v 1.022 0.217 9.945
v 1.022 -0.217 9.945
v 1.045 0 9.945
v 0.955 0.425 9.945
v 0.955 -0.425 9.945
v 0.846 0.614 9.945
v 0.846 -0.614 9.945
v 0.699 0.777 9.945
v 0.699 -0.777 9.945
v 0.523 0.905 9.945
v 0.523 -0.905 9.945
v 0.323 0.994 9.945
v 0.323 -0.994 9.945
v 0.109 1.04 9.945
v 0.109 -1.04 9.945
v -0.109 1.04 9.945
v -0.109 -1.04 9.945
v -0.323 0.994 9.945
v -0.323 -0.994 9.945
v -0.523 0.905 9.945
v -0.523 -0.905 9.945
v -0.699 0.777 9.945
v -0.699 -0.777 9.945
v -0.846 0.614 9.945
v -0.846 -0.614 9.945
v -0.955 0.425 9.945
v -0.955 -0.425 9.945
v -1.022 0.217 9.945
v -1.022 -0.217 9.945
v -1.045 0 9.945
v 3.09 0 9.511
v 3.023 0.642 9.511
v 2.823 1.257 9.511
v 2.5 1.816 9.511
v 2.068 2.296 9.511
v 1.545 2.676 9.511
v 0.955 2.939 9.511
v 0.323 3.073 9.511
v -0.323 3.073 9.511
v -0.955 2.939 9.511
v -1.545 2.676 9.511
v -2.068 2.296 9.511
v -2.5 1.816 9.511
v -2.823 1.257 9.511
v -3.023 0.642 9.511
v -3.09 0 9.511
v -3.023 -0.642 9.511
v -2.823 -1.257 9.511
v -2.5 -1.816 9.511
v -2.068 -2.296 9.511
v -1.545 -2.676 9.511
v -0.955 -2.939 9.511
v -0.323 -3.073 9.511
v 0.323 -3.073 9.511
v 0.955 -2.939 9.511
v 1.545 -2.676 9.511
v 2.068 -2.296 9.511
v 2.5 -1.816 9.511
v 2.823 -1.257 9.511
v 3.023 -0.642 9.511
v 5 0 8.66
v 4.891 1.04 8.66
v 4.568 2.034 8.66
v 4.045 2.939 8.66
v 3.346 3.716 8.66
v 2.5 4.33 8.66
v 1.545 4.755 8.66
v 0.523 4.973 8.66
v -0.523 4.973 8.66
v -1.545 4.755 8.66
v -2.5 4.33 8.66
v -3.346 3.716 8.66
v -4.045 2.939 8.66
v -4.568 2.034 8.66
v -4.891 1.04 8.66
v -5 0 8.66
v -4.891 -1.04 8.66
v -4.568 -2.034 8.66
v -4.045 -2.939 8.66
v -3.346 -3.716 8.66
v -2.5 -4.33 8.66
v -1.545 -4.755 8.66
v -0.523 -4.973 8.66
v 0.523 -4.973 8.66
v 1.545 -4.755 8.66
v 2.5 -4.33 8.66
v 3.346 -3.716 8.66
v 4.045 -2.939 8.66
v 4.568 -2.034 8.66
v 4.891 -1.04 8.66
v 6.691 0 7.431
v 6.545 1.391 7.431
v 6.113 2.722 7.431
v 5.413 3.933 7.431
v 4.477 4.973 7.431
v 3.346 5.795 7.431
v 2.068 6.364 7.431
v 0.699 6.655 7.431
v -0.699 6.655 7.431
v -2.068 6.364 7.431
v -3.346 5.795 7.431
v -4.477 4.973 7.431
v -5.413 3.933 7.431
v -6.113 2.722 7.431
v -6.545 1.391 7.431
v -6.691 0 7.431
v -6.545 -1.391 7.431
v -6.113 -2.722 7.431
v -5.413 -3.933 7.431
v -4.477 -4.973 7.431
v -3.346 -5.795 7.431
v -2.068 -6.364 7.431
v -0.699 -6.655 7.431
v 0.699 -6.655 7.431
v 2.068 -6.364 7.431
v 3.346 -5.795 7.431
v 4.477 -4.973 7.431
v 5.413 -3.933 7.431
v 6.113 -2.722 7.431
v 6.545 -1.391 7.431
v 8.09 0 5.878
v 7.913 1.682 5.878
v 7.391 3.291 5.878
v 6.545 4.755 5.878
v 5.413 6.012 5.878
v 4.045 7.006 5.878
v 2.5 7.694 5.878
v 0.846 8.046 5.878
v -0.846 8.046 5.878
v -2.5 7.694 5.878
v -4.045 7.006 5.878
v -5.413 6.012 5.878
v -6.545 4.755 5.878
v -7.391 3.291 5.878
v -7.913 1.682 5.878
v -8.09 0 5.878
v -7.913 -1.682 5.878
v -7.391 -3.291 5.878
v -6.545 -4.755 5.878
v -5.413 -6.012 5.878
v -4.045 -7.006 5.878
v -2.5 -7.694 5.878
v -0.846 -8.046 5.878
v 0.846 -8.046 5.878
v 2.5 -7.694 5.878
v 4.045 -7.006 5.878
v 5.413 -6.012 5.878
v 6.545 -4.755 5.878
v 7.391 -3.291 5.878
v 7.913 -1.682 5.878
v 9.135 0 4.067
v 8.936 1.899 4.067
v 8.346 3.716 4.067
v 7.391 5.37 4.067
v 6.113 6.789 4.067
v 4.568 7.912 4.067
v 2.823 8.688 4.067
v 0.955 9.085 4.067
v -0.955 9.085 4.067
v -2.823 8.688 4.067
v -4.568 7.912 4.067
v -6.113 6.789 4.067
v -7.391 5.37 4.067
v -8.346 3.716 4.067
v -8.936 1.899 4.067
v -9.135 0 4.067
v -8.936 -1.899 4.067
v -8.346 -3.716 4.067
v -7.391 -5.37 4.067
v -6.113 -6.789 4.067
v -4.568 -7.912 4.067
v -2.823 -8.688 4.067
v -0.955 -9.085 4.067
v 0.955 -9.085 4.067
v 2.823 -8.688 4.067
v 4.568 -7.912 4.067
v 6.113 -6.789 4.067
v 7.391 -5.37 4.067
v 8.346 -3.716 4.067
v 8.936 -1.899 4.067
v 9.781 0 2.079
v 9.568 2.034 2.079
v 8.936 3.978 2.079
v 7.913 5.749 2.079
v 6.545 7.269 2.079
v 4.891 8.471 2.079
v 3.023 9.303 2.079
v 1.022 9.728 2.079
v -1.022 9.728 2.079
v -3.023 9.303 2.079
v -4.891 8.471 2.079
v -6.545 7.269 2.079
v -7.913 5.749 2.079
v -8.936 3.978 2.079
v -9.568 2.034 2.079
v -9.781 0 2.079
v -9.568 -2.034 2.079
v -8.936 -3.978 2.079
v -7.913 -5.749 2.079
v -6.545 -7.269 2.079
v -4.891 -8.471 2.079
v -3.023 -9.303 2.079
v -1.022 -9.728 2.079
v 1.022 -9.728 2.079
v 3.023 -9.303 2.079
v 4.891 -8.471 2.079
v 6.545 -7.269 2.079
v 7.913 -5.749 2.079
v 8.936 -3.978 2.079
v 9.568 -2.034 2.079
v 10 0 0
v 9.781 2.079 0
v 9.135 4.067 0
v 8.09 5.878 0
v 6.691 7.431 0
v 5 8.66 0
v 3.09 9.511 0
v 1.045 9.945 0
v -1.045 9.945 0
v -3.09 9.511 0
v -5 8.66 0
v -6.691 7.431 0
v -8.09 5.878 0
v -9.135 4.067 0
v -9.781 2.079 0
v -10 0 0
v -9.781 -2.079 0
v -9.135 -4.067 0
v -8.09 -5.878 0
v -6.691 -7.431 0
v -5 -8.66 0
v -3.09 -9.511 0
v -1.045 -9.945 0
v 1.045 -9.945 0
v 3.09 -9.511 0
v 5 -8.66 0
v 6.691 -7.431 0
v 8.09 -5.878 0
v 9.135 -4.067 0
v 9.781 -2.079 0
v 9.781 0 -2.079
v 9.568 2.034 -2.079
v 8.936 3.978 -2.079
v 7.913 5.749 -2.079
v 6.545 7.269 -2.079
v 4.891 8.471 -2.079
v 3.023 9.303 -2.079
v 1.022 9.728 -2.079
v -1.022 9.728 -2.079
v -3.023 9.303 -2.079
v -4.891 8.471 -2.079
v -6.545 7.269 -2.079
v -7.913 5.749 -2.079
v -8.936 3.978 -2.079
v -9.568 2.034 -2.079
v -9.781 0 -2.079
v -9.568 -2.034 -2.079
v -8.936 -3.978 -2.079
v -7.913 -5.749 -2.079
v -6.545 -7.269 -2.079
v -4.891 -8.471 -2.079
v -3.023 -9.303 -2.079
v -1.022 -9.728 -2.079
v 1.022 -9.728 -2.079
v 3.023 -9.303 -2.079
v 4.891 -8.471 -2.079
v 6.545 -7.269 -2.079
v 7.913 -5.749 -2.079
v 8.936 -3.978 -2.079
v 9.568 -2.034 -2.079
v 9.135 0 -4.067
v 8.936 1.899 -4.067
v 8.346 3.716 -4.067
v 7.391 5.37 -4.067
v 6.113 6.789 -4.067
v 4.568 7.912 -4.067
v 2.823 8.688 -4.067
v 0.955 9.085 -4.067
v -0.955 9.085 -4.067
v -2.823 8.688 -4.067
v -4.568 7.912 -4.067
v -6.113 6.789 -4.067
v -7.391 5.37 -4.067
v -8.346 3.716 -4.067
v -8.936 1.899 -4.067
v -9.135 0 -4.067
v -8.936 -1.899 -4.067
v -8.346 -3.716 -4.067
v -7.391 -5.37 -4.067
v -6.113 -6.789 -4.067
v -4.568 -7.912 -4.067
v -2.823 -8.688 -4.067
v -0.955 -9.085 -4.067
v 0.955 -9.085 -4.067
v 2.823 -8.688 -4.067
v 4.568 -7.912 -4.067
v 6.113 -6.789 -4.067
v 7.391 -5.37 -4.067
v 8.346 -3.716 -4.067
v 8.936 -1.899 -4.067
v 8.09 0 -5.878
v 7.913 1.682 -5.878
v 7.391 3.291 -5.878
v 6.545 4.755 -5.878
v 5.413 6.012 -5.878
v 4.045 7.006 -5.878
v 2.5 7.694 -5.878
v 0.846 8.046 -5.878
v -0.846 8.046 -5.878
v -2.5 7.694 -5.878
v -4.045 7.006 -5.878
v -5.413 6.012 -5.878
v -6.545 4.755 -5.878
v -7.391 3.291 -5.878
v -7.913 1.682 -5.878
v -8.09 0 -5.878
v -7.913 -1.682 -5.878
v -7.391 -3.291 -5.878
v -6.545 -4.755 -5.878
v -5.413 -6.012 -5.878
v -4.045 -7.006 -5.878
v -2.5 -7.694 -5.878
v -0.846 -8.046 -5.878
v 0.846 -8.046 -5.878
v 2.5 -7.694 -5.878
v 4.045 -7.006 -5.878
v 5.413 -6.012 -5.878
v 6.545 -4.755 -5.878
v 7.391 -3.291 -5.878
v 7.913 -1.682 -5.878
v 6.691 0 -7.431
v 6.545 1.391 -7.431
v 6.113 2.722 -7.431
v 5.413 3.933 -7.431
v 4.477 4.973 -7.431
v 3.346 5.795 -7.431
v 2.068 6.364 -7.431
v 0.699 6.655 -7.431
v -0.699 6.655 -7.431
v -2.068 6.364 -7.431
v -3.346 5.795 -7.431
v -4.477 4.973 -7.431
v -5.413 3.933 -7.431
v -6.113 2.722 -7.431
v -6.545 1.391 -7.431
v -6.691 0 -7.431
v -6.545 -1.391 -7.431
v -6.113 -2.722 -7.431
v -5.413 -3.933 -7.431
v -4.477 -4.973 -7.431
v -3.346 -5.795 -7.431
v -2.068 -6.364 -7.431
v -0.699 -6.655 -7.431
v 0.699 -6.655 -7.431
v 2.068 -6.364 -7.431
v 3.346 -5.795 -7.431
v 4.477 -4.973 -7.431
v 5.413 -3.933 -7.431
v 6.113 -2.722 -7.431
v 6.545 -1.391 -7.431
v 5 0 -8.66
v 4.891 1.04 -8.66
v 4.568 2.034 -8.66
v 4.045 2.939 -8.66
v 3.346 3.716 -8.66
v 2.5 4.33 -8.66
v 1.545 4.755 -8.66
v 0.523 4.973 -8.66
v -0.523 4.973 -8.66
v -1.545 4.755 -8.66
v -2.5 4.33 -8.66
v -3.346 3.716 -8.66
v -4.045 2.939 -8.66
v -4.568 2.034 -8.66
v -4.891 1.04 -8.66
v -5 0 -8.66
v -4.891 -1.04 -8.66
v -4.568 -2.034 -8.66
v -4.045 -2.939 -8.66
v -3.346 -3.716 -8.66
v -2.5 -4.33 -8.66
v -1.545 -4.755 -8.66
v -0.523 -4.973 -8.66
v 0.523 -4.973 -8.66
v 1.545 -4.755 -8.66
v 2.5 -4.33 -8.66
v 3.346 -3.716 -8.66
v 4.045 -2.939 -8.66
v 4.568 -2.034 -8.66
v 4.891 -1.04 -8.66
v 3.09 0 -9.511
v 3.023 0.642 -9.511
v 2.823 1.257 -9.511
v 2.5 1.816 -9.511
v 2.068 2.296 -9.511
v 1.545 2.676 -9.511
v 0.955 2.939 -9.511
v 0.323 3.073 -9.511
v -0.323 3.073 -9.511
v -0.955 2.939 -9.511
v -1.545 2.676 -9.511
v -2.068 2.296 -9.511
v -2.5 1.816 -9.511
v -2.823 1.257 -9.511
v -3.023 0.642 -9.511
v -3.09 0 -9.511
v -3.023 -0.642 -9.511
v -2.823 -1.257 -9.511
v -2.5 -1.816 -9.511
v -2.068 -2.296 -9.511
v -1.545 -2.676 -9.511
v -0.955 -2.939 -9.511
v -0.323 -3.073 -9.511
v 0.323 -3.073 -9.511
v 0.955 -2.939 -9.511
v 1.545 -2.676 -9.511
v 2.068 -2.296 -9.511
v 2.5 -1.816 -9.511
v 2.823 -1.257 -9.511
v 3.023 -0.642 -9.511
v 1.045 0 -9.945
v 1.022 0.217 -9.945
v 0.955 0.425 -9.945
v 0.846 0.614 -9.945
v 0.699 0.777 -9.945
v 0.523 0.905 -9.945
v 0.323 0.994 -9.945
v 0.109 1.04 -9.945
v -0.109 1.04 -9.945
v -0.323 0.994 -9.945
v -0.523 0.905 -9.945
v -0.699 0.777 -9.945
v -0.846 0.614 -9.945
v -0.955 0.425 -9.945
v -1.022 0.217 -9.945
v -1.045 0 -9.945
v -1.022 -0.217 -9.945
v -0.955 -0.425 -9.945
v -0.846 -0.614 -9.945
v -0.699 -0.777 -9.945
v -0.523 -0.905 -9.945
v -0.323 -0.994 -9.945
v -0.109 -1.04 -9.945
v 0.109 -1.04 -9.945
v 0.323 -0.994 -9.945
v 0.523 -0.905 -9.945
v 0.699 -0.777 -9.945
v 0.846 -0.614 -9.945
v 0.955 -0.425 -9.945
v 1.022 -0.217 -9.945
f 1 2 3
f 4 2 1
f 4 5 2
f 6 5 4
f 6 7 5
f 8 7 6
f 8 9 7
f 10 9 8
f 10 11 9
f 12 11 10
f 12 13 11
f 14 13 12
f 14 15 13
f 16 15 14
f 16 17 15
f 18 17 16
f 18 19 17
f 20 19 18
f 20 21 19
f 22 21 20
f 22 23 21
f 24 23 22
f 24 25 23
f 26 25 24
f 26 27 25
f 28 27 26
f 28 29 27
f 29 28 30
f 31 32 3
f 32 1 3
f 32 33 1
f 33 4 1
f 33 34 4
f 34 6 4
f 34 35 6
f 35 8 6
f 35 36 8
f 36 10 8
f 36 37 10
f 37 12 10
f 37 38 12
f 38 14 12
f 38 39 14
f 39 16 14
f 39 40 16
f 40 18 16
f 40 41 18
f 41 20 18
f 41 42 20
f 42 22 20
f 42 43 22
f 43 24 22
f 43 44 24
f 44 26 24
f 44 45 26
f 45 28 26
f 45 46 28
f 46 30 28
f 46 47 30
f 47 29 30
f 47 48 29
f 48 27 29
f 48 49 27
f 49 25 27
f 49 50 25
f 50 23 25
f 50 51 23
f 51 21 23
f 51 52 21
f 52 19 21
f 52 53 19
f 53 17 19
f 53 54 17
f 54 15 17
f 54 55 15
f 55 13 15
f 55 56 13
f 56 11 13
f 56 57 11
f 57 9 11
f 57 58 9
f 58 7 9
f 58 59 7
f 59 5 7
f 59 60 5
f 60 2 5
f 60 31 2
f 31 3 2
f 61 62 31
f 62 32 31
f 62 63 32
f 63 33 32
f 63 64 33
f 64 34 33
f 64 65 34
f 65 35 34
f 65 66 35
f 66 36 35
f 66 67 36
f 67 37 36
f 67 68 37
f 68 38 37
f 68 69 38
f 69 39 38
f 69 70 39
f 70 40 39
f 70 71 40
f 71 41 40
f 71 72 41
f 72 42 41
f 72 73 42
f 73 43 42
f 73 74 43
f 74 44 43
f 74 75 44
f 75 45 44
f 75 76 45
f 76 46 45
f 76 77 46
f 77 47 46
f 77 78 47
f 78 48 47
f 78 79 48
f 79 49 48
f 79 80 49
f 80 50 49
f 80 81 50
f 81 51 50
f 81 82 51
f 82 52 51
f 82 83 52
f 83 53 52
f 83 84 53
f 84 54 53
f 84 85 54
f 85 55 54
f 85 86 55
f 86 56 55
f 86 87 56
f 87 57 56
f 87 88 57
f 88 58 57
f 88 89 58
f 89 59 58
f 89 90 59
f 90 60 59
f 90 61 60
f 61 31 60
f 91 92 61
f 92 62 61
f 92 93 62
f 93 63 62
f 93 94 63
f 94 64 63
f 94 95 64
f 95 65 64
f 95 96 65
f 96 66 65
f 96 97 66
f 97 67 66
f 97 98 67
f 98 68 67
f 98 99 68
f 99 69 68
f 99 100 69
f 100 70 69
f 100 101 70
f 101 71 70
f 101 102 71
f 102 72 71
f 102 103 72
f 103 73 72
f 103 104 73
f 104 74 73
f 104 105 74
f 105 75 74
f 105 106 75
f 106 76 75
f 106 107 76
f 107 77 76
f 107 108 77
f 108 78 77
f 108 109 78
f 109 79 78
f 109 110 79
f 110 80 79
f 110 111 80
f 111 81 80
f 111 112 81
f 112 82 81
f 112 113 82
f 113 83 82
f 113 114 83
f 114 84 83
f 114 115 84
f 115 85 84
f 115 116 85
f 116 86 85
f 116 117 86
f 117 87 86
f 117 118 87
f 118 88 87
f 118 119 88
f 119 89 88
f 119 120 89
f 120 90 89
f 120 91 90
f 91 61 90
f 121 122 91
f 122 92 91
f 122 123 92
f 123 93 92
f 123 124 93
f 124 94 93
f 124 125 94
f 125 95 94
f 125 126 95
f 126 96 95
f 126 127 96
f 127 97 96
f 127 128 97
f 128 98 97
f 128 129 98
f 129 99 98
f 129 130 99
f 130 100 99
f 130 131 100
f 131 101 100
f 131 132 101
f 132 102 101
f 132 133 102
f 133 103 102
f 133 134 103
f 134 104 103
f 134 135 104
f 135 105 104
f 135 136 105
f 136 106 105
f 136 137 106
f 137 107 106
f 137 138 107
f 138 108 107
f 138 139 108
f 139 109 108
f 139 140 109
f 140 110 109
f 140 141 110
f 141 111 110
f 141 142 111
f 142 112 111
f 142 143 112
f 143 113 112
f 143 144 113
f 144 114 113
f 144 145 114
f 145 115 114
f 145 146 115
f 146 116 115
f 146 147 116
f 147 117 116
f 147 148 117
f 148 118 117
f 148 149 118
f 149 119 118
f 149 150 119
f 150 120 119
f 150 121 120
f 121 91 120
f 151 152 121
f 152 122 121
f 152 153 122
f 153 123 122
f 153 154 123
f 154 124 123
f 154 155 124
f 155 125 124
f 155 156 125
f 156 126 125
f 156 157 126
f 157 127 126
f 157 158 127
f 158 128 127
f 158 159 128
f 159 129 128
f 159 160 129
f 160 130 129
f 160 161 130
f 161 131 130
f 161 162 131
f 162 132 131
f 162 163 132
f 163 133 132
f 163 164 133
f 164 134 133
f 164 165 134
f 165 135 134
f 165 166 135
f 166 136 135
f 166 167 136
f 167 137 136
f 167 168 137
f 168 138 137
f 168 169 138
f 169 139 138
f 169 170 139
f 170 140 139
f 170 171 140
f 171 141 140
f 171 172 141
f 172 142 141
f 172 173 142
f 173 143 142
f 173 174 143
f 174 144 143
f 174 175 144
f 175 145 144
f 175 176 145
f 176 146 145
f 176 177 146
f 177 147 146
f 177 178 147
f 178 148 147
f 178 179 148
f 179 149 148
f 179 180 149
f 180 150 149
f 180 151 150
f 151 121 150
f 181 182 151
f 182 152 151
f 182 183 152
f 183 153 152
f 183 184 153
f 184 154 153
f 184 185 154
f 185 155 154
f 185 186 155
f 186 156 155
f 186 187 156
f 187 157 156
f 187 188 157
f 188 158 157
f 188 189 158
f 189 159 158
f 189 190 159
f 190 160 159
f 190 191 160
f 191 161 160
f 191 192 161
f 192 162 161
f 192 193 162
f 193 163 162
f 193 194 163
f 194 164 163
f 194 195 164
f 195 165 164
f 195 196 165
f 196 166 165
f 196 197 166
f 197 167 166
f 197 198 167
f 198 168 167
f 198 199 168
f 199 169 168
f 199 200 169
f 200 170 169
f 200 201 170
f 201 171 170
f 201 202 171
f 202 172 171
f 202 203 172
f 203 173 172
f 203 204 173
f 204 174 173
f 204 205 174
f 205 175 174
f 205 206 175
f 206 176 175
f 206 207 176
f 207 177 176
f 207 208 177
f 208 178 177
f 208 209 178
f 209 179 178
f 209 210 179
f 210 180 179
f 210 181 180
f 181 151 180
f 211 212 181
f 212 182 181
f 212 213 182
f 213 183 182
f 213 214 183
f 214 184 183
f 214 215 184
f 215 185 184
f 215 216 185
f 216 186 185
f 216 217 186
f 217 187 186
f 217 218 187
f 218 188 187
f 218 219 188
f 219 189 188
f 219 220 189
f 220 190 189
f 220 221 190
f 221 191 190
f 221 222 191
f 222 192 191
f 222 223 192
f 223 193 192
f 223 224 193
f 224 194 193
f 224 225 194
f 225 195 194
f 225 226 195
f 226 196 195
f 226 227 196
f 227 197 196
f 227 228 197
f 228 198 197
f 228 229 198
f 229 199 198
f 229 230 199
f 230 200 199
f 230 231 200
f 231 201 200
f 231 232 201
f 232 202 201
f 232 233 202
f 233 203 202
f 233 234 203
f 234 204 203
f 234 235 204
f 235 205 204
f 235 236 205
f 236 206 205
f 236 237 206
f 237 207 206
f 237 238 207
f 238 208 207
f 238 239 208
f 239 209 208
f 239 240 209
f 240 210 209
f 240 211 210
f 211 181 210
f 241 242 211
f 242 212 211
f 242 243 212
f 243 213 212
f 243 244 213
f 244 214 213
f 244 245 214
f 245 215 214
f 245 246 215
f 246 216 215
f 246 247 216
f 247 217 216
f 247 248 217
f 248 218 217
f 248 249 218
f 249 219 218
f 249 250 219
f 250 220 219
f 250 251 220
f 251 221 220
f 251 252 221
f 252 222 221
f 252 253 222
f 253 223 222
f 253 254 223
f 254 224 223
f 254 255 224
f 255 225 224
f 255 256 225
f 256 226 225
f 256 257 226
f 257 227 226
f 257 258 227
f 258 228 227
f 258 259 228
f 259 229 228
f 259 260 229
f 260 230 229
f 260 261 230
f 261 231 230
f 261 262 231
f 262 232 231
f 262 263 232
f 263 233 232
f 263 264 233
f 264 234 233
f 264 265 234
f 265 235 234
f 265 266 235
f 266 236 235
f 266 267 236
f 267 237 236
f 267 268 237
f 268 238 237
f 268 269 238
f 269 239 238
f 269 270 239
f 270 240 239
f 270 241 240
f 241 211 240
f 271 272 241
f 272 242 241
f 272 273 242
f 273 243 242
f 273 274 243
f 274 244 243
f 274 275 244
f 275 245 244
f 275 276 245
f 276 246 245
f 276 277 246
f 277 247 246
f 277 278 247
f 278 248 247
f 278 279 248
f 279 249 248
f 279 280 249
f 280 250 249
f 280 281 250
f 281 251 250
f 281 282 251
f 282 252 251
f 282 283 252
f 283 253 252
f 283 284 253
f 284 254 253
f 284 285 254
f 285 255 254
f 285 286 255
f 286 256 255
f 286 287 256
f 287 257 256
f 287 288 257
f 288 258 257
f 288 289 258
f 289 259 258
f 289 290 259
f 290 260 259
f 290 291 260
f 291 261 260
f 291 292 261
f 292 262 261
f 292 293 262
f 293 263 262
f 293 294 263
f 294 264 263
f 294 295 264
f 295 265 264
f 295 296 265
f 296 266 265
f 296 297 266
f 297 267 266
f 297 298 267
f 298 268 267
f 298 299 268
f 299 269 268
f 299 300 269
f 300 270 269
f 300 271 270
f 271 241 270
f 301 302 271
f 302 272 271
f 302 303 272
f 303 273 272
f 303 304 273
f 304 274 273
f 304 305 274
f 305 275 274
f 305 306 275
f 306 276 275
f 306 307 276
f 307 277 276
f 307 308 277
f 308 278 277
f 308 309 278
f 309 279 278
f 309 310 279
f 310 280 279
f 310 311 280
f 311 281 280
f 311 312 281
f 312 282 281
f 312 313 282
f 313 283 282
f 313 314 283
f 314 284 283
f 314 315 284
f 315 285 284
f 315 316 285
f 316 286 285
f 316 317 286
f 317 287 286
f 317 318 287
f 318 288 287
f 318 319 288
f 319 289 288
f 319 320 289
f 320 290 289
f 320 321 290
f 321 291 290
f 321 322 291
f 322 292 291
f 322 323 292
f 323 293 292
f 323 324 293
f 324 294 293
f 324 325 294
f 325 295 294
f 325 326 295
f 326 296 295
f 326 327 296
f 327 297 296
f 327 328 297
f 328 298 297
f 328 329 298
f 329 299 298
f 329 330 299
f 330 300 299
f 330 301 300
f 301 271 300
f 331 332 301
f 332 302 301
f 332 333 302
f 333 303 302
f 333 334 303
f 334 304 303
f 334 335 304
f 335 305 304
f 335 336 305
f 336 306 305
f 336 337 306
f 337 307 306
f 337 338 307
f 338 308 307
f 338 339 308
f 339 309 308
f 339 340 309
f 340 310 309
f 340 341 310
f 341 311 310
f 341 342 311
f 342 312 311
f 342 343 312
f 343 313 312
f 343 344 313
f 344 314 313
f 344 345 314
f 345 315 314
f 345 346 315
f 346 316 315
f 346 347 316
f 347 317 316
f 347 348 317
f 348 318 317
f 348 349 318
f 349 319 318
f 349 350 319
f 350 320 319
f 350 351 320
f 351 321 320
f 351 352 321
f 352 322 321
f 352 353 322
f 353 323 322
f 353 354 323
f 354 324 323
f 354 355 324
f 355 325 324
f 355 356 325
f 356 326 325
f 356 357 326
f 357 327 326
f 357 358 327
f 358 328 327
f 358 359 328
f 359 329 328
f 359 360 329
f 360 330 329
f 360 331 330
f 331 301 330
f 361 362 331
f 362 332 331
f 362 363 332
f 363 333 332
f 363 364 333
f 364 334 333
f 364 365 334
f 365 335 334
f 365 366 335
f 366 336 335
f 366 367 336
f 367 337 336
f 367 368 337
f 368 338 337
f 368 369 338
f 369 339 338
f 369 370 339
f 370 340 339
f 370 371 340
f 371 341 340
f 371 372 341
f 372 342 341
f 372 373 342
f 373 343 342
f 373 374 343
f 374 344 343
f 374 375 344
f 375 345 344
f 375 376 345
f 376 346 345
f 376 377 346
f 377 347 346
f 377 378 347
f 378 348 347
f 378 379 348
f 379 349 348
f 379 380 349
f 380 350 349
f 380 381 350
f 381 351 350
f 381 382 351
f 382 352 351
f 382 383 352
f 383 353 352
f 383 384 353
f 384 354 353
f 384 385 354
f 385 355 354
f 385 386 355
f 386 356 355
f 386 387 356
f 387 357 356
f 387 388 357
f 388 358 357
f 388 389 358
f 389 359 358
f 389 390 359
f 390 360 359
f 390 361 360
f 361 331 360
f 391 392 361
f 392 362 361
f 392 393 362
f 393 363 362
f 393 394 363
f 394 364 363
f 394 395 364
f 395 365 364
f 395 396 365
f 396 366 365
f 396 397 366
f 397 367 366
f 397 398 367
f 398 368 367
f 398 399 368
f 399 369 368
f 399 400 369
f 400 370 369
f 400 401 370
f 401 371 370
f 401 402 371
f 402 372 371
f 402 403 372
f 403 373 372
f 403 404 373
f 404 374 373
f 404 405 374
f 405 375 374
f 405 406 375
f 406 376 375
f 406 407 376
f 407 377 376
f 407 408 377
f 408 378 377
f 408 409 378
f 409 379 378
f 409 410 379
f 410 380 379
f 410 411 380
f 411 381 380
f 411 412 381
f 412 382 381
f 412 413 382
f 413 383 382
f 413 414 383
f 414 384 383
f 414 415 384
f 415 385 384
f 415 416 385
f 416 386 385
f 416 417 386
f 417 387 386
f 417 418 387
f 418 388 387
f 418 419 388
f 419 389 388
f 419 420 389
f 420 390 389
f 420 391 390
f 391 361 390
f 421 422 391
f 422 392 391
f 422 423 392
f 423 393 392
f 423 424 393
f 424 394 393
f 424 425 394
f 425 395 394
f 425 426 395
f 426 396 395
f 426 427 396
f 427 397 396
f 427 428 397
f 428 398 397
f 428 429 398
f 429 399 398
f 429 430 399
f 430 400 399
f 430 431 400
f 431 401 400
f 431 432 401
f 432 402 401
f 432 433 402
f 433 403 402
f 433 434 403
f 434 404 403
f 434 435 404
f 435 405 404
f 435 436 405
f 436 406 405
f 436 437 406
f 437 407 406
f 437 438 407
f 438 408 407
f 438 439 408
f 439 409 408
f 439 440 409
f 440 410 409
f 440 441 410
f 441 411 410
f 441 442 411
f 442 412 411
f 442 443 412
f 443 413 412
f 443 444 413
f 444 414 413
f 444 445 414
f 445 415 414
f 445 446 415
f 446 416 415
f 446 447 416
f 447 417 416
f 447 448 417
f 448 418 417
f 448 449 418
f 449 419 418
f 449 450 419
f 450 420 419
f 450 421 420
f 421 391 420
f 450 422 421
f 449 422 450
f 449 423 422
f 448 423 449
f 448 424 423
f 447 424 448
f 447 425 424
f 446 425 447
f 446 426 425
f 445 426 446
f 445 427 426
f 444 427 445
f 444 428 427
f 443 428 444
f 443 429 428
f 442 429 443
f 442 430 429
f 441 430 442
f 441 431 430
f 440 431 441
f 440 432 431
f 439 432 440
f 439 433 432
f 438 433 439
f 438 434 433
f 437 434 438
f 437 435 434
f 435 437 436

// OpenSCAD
// param: radius=10
module param_sphere(radius=10) {
    sphere(r=radius);
}
param_sphere(radius=10);
